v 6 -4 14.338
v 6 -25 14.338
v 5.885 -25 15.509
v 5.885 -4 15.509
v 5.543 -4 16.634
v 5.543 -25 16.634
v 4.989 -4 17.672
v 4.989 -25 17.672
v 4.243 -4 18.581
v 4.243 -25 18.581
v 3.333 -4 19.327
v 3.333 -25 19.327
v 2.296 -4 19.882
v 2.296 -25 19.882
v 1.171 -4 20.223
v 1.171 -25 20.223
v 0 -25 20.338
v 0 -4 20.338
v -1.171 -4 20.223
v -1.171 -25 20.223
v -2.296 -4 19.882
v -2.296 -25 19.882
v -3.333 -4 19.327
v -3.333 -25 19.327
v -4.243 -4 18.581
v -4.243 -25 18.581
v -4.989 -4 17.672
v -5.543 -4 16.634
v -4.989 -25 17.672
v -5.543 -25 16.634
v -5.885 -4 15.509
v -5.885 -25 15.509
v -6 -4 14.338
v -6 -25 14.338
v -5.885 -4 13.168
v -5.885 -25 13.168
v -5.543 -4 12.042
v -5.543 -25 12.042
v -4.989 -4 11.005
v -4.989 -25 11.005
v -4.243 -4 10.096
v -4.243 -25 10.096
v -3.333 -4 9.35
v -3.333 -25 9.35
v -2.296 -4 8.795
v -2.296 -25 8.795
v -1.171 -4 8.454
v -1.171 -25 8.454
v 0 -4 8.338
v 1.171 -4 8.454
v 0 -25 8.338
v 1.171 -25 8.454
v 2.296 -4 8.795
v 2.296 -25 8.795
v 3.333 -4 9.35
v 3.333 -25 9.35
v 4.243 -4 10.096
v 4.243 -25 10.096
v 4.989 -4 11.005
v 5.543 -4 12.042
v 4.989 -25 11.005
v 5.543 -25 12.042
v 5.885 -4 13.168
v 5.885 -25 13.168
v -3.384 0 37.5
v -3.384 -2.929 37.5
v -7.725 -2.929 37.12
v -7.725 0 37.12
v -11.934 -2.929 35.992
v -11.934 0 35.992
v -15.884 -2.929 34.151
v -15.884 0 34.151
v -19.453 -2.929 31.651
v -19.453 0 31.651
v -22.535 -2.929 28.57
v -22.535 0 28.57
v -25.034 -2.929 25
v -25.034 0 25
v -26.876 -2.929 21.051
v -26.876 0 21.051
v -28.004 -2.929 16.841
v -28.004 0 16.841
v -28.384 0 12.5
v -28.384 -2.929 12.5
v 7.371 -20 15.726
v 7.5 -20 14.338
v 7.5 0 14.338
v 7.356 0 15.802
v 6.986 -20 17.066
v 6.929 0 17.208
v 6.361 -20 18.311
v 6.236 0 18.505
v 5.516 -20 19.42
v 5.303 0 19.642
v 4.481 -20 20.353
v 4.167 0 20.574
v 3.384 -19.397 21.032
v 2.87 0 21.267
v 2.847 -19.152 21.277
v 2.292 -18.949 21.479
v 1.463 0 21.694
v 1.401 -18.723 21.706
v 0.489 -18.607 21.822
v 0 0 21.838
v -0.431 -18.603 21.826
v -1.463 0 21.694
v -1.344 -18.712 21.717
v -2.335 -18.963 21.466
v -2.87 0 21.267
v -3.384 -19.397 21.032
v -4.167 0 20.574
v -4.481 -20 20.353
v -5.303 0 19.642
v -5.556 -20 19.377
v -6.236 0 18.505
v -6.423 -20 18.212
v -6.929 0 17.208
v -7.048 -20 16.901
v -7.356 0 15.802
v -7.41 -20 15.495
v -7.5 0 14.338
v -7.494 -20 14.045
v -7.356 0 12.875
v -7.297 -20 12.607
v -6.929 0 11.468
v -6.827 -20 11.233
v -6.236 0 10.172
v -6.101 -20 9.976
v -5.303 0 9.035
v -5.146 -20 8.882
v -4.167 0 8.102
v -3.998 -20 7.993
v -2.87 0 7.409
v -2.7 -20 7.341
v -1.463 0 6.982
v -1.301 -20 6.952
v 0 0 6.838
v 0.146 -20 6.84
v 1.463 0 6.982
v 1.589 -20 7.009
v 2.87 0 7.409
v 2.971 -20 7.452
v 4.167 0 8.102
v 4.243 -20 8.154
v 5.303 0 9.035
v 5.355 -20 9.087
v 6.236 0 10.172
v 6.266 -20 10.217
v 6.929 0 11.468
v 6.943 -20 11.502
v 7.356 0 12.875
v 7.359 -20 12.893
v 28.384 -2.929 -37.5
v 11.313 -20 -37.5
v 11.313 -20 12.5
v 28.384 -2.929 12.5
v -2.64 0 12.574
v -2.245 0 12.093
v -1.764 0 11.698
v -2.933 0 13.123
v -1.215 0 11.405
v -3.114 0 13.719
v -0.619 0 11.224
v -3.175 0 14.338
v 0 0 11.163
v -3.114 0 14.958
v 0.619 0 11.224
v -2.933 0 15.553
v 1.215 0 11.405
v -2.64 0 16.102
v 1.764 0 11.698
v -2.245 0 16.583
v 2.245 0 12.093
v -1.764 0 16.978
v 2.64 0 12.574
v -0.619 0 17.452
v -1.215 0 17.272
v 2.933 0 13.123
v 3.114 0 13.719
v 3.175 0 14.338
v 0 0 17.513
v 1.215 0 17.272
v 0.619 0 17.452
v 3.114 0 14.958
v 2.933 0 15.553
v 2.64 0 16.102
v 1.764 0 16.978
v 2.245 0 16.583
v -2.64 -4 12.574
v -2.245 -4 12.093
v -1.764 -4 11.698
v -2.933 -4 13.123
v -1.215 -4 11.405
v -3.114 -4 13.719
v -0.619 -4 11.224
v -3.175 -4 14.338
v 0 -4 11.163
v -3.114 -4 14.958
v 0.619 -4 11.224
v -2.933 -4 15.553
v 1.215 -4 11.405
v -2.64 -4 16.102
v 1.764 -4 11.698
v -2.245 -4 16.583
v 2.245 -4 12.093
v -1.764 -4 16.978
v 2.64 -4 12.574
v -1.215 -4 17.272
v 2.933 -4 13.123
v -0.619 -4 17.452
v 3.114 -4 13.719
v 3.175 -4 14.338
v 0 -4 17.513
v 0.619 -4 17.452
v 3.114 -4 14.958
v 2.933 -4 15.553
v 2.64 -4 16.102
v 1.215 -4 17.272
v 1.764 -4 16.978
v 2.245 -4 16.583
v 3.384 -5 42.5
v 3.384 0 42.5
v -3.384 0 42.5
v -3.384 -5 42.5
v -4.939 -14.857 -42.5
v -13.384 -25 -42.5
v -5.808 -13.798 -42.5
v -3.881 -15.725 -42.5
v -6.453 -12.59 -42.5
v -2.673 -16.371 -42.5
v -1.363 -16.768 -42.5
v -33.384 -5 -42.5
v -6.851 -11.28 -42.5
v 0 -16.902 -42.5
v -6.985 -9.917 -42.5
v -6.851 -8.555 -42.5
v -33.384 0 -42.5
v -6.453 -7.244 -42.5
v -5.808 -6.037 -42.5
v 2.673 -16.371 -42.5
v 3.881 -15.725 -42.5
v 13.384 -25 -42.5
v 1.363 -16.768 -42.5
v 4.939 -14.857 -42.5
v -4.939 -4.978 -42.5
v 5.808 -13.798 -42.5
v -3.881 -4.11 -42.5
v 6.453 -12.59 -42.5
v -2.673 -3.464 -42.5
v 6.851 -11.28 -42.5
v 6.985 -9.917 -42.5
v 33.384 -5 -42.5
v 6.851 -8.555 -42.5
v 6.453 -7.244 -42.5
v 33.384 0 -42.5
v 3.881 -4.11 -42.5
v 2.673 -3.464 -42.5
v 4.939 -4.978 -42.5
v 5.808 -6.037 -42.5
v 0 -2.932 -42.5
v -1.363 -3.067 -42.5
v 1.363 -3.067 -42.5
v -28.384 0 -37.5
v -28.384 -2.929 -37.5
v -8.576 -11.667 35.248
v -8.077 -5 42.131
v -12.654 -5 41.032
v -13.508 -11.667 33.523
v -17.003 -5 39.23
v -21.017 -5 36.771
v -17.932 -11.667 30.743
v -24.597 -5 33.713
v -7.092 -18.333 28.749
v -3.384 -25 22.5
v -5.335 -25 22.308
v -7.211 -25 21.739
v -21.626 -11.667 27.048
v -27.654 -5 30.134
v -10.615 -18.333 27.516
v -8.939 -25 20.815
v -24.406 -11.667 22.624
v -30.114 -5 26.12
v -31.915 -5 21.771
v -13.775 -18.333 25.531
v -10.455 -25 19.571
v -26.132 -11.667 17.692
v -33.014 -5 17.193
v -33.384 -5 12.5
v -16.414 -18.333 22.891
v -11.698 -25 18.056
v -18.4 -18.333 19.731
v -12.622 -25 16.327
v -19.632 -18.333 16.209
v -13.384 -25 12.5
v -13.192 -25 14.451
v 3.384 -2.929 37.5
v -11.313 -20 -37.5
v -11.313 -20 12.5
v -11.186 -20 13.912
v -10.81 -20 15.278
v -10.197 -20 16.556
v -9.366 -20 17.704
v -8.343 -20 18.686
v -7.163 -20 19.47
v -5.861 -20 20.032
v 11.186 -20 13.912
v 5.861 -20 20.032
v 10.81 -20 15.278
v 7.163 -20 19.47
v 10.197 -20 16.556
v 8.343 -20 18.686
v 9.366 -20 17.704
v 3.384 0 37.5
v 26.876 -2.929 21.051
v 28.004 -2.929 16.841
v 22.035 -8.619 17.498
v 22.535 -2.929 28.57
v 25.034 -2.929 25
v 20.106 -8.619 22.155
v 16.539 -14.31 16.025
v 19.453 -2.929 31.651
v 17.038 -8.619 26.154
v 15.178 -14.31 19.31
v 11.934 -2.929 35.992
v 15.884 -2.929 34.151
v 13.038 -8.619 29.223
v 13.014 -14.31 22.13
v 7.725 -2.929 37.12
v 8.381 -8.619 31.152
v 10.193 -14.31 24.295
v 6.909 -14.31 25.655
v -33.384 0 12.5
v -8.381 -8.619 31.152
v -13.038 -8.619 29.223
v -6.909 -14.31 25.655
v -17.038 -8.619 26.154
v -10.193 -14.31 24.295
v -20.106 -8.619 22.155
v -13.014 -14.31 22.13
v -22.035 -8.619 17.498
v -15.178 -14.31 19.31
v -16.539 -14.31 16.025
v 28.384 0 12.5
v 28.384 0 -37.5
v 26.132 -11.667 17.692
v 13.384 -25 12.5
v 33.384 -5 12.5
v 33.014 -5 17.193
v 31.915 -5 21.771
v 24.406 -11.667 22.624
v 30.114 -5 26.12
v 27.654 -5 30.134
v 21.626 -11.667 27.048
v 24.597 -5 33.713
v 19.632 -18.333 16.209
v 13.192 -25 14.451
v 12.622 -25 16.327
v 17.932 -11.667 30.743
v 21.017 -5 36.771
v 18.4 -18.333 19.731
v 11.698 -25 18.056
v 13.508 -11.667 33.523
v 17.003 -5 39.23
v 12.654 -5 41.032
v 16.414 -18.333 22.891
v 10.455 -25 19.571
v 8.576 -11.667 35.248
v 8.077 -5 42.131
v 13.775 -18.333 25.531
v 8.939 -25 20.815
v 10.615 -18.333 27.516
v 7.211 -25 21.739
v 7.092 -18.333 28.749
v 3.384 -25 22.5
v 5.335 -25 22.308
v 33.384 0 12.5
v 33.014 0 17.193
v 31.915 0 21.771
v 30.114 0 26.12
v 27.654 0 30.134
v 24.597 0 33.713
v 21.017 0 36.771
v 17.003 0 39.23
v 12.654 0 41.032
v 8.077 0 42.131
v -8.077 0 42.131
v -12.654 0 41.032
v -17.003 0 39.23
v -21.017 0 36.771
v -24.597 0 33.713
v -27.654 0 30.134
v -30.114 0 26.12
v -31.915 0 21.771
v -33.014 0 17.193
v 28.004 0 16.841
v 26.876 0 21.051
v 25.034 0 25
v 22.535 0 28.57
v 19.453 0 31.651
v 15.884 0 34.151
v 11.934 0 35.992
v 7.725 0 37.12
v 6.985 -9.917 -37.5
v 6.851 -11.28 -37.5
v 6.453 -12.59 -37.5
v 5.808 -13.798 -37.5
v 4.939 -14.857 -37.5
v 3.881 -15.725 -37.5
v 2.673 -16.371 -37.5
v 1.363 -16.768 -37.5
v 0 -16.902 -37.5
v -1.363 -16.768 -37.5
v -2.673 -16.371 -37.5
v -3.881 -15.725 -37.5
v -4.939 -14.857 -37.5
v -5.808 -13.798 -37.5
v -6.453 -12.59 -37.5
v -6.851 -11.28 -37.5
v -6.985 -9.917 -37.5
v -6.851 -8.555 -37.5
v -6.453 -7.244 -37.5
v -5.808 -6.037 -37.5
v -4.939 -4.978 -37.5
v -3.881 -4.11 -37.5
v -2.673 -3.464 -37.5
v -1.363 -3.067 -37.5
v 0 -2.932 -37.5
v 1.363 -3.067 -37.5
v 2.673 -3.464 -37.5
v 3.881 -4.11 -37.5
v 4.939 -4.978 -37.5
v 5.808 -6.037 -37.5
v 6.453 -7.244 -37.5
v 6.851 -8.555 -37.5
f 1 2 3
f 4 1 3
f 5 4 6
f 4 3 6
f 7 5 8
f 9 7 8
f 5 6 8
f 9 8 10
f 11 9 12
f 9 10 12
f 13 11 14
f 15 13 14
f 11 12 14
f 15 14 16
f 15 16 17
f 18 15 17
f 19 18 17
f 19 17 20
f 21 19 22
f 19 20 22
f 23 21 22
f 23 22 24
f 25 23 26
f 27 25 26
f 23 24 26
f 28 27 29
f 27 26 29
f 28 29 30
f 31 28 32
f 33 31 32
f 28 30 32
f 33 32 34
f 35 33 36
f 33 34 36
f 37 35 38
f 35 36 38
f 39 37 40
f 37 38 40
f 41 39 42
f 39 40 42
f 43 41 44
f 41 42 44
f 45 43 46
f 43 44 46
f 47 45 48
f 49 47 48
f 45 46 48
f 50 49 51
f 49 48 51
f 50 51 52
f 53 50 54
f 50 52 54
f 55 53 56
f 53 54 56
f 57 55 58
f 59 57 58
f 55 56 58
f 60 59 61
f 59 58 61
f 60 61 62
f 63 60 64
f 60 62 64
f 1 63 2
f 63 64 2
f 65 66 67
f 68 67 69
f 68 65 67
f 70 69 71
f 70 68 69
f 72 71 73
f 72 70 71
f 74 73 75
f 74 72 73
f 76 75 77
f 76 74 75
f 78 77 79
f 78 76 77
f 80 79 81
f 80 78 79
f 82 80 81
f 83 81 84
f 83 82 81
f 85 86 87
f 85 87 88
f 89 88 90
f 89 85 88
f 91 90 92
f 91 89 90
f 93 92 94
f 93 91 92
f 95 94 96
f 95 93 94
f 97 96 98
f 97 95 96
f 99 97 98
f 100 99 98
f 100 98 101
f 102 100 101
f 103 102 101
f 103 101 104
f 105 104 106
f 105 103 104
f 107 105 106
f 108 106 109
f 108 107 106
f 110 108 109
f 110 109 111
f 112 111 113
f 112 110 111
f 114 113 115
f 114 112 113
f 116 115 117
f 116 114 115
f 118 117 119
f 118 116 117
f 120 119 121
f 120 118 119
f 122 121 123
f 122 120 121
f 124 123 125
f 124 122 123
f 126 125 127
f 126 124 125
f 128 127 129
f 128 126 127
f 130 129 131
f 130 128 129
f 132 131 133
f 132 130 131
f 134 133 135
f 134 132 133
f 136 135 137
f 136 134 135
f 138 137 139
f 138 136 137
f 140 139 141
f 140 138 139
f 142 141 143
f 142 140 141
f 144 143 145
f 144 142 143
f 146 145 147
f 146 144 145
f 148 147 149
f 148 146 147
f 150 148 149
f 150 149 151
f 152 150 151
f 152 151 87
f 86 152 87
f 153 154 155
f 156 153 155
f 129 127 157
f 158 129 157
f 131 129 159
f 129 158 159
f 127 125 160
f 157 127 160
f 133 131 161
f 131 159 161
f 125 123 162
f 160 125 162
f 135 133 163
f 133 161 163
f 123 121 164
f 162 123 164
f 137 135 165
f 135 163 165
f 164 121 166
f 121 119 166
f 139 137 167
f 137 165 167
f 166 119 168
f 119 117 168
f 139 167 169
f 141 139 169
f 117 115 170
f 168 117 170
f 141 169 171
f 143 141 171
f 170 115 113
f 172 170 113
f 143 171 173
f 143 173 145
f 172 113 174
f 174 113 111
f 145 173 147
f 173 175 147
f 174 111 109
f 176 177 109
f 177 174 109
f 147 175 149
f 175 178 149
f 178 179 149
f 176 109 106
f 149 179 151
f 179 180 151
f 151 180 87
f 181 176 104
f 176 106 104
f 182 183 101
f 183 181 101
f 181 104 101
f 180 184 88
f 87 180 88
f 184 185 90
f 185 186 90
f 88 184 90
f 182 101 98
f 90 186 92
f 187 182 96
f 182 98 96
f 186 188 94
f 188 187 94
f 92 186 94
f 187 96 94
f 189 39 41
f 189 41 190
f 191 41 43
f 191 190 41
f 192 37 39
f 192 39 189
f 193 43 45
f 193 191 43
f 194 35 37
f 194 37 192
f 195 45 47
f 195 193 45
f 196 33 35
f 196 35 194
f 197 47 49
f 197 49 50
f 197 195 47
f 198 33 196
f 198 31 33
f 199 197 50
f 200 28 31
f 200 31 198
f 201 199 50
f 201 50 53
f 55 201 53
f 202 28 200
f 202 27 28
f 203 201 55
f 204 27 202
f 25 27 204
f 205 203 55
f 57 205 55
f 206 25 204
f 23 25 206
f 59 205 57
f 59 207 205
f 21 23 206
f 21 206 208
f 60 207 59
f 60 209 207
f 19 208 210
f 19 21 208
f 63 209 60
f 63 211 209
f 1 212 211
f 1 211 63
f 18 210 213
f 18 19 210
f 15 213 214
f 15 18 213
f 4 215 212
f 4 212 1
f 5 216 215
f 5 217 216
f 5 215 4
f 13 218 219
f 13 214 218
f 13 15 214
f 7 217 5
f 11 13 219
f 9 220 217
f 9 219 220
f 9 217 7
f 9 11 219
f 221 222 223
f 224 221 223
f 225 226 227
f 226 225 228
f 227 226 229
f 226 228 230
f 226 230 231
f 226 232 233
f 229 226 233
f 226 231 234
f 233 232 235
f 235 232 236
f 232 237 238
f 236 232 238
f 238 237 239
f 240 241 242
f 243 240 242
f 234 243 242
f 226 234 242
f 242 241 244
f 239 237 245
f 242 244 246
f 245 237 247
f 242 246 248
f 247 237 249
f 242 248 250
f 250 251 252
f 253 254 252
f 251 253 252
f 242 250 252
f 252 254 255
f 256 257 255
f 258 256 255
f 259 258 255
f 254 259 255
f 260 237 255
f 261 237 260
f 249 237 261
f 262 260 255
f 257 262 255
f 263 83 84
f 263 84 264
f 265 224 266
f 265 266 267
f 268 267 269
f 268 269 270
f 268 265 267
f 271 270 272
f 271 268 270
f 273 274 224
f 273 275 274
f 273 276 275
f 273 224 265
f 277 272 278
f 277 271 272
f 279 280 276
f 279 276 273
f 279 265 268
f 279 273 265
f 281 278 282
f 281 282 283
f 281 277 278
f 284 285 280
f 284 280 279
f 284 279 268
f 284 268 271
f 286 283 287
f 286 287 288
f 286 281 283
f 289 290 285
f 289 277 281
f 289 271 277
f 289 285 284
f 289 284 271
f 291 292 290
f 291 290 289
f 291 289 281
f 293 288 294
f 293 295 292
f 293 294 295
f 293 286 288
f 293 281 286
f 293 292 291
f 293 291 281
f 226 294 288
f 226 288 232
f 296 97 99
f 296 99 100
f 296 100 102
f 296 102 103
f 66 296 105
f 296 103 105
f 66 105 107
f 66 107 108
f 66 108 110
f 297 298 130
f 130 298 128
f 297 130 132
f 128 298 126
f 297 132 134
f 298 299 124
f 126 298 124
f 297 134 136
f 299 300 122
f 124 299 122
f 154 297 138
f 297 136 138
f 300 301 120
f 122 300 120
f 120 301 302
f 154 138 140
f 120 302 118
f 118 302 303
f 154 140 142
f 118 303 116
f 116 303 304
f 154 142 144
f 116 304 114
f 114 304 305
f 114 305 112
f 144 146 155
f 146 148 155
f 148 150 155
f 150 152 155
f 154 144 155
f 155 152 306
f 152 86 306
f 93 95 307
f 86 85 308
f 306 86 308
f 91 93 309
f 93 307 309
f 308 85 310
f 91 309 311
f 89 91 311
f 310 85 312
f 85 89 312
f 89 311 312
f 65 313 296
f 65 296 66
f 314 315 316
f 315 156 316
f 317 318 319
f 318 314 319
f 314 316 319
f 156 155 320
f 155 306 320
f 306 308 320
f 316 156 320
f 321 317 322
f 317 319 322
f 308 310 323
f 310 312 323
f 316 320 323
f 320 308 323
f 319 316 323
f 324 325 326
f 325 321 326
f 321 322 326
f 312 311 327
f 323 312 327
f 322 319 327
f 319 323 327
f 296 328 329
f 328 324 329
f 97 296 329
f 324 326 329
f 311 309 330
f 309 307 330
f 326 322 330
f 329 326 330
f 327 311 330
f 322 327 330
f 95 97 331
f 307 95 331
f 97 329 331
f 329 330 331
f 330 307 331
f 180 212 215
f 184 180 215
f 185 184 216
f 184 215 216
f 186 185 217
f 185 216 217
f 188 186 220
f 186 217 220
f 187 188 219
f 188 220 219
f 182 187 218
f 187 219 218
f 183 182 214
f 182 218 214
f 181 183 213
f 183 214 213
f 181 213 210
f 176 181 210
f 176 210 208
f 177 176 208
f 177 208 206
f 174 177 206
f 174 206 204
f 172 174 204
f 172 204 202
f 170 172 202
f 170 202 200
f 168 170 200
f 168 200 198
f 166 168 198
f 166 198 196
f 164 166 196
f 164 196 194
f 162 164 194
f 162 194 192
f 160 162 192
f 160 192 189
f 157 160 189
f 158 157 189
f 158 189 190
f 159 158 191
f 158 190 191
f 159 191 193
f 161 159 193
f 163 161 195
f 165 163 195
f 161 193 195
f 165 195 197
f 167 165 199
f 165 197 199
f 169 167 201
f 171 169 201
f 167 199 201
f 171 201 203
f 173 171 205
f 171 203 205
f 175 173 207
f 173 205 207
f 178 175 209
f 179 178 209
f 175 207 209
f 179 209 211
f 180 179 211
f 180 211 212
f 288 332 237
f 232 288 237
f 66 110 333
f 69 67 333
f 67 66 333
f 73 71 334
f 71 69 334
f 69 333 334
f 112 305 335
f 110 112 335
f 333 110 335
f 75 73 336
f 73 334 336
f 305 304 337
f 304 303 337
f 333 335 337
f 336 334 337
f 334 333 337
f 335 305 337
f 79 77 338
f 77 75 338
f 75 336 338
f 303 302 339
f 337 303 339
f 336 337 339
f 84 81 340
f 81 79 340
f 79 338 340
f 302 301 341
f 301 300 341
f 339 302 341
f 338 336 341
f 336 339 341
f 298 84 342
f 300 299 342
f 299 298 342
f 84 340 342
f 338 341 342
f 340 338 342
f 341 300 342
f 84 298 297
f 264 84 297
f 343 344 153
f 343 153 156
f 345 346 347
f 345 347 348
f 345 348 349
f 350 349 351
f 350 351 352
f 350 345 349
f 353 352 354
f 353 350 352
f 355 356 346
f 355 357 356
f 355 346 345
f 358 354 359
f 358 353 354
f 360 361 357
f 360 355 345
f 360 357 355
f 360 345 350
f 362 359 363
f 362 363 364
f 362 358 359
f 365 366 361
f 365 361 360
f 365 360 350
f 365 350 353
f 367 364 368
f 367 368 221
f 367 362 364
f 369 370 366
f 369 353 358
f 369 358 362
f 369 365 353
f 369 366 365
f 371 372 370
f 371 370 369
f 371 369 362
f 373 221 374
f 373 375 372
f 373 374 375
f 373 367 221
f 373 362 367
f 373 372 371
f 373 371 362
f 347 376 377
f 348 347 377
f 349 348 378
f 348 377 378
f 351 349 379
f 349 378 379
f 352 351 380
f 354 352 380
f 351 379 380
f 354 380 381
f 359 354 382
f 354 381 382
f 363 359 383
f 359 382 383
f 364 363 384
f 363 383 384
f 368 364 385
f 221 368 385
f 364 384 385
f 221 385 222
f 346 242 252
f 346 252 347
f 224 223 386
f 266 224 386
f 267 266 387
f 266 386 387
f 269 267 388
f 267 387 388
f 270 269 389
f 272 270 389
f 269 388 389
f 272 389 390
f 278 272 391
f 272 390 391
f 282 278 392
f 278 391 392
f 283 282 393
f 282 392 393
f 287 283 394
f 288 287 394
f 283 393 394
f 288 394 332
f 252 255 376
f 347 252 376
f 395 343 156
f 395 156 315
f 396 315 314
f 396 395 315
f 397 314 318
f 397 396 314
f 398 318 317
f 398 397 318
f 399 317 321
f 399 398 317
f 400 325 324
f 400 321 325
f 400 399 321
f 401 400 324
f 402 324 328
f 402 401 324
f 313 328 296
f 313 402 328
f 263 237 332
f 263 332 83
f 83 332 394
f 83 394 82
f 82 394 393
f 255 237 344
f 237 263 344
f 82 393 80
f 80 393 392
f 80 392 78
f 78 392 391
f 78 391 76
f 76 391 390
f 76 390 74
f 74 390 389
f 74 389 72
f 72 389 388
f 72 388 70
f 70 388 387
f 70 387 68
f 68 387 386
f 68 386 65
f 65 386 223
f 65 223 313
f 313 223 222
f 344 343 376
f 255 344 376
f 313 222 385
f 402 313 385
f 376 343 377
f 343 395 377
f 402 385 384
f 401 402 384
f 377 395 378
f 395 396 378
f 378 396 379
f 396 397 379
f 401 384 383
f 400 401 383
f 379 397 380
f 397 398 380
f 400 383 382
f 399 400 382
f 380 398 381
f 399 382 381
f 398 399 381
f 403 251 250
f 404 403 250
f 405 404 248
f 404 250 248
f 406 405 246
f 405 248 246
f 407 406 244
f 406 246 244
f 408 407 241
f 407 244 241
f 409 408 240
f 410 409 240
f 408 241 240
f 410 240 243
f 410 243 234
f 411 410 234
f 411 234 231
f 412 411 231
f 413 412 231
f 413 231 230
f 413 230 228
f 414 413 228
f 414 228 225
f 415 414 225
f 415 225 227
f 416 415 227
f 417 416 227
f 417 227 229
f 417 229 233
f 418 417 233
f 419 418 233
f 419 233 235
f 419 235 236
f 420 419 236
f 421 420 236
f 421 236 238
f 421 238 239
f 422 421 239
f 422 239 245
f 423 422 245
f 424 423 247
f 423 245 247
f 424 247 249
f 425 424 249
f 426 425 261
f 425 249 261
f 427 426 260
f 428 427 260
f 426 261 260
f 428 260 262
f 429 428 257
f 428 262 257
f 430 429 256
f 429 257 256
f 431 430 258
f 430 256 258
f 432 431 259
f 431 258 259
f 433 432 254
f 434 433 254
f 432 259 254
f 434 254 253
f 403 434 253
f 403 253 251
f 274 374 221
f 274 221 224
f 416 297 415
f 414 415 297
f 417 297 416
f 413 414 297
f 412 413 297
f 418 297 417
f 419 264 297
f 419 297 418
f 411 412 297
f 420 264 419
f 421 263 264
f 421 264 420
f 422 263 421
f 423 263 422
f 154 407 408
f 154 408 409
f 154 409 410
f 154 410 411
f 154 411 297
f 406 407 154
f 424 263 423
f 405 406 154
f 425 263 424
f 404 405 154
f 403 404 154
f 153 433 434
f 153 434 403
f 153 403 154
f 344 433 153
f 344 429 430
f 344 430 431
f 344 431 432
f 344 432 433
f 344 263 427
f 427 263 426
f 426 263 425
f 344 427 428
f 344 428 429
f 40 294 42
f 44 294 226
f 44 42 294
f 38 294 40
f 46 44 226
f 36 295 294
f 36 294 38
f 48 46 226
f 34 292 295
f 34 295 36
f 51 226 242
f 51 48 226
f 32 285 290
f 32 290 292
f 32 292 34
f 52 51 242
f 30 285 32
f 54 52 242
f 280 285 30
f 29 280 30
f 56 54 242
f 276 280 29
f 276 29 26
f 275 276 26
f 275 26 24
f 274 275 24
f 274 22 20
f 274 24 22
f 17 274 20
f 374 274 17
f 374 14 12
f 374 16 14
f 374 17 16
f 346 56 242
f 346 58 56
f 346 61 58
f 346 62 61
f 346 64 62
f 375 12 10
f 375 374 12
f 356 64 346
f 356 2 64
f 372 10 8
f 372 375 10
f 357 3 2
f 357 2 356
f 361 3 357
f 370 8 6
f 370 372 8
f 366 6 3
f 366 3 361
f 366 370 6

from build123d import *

# Parameters (mm, degrees)
F1_DEPTH  = 25
F2_SIZE   = 20
F3_T      = -5
F4_R      = 6.985
F5_DEPTH  = 25
F6_R      = 7.5
F7_DEPTH  = 25
F8_R      = 6
F10_DEPTH = 21
F11_R     = 3.175
F12_DEPTH = 25


with BuildPart() as f1:
    # F0 (on Front) → F1 (new body)
    with BuildSketch(Plane.XZ):
        with BuildLine():
            ThreePointArc((33.383667, 12.5), (24.59687, 33.713203), (3.383667, 42.5))
            Line((3.383667, 42.5), (-3.383667, 42.5))
            ThreePointArc((-3.383667, 42.5), (-24.59687, 33.713203), (-33.383667, 12.5))
            Line((-33.383667, 12.5), (-33.383667, -42.5))
            Line((-33.383667, -42.5), (33.383667, -42.5))
            Line((33.383667, -42.5), (33.383667, 12.5))
        make_face()
    extrude(amount=F1_DEPTH)

    # F2
    f2_edges = [f1.edges().sort_by_distance(p)[0] for p in [
        (-33.383667, -25, -15),
    ]]
    chamfer(f2_edges, length=F2_SIZE)

    # F3
    f3_openings = [f1.faces().sort_by_distance(p)[0] for p in [
        (0, 0, -2.614615),
    ]]
    offset(amount=F3_T, openings=f3_openings)

    # F4 (on face) → F5 (cut)
    with BuildSketch(Plane(origin=(0, 0, -42.5), x_dir=(1, 0, 0), z_dir=(0, 0, -1))):
        with Locations((0, 9.917389)):
            Circle(F4_R)
    extrude(amount=-F5_DEPTH, mode=Mode.SUBTRACT)

    # F6 (on face) → F7 (join, through all)
    with BuildSketch(Plane.XZ.offset(25)):
        with Locations((0, 14.338327)):
            Circle(F6_R)
    extrude(amount=-F7_DEPTH)

    # F8 (on face) → F10 (cut, through all)
    with BuildSketch(Plane.XZ.offset(25)):
        with Locations((0, 14.338327)):
            Circle(F8_R)
    extrude(amount=-F10_DEPTH, mode=Mode.SUBTRACT)

    # F11 (on face) → F12 (cut, through all)
    with BuildSketch(Plane.XZ.offset(25)):
        with Locations((0, 14.338327)):
            Circle(F11_R)
    extrude(amount=-F12_DEPTH, mode=Mode.SUBTRACT)


solid = f1.part
